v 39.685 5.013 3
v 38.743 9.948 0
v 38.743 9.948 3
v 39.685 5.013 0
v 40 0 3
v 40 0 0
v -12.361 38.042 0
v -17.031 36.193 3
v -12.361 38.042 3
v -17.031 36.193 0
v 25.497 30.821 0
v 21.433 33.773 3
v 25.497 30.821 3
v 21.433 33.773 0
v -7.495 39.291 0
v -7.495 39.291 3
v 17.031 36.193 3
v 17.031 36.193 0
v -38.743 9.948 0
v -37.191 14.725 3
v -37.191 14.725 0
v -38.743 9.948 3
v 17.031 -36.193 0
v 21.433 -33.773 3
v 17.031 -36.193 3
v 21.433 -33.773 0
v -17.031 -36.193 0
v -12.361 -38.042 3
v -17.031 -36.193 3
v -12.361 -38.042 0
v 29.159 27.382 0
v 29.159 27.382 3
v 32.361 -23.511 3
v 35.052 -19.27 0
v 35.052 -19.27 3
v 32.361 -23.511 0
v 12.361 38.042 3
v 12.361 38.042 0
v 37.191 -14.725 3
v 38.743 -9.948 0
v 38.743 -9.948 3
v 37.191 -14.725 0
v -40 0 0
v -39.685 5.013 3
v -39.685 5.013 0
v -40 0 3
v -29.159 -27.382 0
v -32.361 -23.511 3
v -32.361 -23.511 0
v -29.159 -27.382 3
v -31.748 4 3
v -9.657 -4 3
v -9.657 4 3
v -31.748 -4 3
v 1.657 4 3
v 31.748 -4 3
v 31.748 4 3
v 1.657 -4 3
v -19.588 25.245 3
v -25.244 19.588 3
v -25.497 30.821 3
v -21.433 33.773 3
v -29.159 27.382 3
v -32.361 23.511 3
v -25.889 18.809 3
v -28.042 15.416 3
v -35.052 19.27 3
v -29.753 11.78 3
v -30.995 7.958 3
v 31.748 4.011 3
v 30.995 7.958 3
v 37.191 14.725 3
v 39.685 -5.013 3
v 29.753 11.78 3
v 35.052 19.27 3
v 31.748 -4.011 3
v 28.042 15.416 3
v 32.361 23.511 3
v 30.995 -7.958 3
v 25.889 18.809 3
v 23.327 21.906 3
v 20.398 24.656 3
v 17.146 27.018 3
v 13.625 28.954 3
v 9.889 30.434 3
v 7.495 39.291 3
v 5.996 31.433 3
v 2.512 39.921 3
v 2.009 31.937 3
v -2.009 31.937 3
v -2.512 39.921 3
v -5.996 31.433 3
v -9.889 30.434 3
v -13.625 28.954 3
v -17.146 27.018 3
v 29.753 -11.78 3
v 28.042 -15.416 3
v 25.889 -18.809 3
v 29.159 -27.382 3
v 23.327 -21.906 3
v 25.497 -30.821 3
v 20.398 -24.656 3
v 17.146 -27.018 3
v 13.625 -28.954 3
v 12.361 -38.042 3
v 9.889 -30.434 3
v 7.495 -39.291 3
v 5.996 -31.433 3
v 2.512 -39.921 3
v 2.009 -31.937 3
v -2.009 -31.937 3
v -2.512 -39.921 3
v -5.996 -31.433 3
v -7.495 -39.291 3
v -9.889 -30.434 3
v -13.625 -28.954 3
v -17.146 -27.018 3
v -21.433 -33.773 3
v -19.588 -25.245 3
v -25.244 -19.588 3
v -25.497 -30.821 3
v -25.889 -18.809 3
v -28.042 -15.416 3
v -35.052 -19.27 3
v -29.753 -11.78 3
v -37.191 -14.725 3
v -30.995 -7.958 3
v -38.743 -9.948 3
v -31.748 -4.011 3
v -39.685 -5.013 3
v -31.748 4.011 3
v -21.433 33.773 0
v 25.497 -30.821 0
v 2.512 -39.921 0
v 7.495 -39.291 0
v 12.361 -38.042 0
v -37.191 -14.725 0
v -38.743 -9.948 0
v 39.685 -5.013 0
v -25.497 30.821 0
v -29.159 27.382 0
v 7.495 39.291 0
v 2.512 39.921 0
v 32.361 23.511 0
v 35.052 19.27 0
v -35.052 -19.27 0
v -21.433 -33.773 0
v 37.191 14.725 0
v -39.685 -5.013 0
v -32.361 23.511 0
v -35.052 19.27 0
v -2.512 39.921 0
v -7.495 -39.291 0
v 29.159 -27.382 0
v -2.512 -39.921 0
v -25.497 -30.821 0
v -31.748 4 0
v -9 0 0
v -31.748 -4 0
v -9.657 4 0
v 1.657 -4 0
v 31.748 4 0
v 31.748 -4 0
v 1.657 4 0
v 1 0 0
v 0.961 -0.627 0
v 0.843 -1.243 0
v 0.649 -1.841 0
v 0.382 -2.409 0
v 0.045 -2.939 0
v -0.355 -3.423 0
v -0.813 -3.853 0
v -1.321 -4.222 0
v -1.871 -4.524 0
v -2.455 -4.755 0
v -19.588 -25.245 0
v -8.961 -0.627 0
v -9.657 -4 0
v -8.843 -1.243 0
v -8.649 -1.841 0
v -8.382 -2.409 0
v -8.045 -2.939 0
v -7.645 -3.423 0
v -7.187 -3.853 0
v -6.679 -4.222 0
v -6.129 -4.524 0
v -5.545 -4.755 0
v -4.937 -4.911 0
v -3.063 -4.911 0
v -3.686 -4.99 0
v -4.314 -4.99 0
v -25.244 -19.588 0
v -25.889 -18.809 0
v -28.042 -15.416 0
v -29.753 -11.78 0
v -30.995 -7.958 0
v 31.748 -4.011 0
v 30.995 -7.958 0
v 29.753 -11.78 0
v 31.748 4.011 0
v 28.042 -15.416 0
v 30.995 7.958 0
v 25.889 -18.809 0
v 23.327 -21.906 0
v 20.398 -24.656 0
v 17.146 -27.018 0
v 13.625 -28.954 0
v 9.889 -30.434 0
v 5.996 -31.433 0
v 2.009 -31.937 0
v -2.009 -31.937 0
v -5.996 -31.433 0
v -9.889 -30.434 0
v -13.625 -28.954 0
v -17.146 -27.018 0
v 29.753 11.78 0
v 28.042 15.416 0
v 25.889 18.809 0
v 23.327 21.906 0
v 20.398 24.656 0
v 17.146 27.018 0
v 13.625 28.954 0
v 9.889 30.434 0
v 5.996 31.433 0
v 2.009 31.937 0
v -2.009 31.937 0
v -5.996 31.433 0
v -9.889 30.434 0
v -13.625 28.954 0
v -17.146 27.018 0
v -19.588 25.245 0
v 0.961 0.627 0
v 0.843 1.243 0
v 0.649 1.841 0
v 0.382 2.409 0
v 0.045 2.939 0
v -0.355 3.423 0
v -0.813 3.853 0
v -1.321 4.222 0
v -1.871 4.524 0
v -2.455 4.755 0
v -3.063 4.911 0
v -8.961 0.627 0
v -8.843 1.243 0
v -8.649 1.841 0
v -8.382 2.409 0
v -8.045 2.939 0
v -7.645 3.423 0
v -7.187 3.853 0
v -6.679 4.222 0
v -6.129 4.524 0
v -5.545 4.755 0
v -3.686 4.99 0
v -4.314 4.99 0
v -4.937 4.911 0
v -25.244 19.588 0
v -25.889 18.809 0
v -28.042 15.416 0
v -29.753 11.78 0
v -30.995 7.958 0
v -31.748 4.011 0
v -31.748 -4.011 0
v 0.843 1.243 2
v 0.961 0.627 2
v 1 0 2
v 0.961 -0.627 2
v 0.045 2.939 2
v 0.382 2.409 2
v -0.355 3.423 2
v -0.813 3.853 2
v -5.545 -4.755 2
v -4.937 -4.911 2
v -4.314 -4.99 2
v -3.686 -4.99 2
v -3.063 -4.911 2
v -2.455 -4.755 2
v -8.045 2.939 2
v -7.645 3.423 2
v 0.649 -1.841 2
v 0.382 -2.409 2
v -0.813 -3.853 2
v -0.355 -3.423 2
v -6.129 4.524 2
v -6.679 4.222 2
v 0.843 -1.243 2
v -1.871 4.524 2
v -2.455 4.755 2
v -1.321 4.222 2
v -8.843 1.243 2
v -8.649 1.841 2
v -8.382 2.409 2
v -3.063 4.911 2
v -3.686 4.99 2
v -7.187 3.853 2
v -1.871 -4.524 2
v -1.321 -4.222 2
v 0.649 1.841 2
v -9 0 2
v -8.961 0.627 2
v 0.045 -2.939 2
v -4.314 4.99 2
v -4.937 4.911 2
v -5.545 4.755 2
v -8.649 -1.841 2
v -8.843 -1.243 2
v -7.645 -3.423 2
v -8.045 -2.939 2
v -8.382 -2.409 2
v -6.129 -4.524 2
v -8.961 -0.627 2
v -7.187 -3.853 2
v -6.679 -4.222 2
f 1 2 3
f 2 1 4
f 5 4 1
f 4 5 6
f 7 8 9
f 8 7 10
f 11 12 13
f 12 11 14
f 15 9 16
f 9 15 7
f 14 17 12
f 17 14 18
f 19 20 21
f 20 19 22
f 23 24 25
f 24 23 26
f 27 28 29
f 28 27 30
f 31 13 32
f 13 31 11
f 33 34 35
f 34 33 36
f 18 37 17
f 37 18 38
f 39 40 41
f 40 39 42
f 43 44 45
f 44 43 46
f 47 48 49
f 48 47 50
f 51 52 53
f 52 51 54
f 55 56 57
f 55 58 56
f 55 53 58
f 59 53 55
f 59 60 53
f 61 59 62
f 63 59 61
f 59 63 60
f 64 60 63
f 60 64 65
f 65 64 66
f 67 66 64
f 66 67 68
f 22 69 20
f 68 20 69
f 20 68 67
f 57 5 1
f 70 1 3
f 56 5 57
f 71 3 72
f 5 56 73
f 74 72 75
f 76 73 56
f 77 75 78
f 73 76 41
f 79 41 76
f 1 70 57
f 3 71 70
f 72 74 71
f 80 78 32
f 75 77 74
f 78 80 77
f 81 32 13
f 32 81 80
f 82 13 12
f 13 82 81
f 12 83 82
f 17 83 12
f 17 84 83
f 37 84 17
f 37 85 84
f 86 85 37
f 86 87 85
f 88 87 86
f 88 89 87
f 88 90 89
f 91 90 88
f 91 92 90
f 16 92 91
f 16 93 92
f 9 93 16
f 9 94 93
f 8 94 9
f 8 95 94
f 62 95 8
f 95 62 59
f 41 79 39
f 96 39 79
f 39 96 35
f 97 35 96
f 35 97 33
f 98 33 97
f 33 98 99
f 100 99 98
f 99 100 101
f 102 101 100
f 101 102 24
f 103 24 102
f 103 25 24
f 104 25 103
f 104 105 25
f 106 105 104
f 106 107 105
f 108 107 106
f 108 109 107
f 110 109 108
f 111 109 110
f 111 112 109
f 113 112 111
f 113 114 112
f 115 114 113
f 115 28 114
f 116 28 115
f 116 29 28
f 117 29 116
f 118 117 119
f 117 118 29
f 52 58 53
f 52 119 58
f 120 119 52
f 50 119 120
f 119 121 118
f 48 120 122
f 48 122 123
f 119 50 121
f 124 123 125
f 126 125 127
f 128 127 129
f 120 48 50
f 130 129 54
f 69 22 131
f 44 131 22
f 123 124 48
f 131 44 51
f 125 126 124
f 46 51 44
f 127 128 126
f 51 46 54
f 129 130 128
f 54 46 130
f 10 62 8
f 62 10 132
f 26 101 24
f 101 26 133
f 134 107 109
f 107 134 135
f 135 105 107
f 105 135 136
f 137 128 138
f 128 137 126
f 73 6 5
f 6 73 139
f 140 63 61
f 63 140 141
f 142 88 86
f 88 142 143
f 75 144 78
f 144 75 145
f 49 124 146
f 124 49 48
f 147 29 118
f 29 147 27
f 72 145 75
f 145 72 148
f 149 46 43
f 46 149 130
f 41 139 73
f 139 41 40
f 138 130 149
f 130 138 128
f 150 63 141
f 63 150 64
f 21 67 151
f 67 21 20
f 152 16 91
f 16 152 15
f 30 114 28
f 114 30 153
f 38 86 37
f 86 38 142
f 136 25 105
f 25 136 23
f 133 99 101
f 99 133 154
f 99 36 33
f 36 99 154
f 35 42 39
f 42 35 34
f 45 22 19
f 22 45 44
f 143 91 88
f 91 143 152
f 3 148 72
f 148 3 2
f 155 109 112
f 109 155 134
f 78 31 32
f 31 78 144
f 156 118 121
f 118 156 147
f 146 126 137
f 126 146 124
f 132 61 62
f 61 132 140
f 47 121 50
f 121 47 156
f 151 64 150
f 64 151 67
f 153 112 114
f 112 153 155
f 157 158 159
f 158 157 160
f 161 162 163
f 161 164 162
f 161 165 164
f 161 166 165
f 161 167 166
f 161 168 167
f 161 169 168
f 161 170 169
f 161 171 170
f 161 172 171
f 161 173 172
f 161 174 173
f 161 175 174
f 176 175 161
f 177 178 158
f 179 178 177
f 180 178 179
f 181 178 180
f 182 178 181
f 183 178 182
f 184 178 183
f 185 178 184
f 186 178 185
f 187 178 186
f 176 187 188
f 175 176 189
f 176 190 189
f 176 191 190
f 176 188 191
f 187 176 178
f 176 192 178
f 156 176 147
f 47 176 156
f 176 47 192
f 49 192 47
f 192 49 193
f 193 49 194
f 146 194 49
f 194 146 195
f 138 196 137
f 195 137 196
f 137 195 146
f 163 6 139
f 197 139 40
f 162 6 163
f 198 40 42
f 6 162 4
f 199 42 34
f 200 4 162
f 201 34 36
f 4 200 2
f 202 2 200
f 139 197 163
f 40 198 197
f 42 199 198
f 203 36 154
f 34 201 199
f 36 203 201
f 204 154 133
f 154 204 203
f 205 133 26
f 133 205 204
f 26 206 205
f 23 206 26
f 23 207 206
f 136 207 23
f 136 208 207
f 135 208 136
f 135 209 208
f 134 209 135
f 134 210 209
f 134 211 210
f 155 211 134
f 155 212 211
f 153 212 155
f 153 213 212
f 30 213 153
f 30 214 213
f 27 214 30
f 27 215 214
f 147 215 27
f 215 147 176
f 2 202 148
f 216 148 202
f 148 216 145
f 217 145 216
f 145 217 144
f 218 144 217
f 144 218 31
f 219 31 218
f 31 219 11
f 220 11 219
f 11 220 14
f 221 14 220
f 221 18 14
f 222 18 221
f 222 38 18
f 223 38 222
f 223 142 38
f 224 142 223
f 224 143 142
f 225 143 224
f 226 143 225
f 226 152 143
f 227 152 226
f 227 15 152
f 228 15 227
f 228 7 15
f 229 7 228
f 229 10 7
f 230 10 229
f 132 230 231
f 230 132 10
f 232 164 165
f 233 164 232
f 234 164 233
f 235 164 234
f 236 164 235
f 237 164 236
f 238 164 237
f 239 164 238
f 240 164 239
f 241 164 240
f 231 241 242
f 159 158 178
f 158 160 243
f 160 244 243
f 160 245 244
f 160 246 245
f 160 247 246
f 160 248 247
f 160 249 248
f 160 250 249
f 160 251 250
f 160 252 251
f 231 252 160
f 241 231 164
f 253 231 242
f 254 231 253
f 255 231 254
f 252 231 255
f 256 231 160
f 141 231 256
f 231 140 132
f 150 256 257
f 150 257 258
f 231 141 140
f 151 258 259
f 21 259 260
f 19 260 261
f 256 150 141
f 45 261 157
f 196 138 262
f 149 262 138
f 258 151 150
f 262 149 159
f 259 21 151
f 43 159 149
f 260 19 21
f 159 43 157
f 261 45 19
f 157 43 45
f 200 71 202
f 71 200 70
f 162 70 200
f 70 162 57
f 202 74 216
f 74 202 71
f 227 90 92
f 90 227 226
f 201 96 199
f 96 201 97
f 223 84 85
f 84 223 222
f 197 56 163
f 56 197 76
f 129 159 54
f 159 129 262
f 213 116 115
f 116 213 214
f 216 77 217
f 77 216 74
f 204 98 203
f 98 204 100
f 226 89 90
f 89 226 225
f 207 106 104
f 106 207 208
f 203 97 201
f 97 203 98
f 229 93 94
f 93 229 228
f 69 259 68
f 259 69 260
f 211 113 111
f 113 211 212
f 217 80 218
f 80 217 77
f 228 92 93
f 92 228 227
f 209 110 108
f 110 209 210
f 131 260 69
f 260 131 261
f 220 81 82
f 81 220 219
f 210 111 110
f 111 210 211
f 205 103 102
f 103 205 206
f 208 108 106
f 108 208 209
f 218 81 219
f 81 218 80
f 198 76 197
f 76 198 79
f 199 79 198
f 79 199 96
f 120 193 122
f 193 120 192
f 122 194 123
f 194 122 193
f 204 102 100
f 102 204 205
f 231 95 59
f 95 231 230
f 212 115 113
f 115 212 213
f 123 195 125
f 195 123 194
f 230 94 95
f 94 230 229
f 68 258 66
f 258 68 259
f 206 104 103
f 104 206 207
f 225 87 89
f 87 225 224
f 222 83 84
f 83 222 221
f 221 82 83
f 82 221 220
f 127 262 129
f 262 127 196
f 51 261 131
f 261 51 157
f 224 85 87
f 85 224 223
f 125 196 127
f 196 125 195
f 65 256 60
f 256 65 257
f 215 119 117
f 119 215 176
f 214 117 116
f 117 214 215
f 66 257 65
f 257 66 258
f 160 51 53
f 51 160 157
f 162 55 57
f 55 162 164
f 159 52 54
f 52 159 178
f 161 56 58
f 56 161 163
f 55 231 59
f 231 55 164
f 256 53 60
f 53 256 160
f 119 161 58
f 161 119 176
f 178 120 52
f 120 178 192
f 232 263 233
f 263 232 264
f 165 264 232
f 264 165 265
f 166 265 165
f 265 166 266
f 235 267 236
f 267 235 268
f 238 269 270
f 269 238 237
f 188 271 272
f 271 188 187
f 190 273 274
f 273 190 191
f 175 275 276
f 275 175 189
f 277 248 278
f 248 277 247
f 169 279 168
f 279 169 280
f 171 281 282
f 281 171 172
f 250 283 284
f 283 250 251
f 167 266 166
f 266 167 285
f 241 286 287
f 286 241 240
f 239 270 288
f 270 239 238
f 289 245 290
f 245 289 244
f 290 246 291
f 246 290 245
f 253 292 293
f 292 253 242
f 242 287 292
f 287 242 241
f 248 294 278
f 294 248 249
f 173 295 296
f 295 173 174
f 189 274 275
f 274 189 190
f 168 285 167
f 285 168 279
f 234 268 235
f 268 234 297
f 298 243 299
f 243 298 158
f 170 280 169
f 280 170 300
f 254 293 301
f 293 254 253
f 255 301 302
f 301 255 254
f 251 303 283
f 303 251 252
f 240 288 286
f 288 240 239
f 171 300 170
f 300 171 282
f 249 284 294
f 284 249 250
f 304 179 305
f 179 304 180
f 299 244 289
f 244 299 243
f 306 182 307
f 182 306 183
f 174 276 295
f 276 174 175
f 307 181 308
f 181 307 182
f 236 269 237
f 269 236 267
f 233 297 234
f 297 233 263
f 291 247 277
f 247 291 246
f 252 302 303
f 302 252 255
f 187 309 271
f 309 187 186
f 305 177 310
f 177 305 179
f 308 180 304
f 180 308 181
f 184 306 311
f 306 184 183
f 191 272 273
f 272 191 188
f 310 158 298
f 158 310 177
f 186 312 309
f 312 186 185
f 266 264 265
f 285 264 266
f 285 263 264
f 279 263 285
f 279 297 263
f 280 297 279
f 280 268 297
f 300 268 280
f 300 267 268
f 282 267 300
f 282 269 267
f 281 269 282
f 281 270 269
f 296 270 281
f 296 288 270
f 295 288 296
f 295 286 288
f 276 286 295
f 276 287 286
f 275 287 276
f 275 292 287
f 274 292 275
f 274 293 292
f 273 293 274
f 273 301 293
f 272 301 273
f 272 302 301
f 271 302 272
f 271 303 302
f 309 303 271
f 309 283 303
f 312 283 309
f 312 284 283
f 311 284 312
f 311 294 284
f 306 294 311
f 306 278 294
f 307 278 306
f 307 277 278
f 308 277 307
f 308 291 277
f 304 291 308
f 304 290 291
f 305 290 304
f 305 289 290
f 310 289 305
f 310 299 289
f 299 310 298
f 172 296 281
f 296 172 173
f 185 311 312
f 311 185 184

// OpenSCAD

//Thickness/height of sign
height = 3;
//Diameter of sign
diameter = 80;

//width of inner and outer walls
wall_thickness = 8;

/*[Magnet]*/
//Diameter of hole for inserting magnet
magnet_diameter = 10;
//Depth of hole for magnet
magnet_thickness = 2;


/*[Extra-advanced]*/
inside_resolution = 50;

outside_resolution = 50;
//for aligning rotated bars to center of ring 
delta_stick_move = sqrt(pow((wall_thickness/2),2)/2);

// preview[view:south west, tilt:top diagonal]

//outside ring
difference(){
	translate([0,0,height/2])
	cylinder(h = height, r = diameter/2, $fn = outside_resolution, center = true);
	translate([0,0,height/2 - 1])
	cylinder(h = height + 3, r = (diameter - wall_thickness*2)/2, $fn = inside_resolution, center = true);
}

//make hole for magnet
difference(){
//union body
union(){

//middlestick
translate([-diameter/2 + wall_thickness/2, -wall_thickness/2, 0]) 
cube([diameter - wall_thickness, wall_thickness, height]);

//first sidestick

translate([delta_stick_move,delta_stick_move,0])
rotate([0,0,135]) 
cube([diameter/2 - wall_thickness/2, wall_thickness, height]);

//second sidestick
mirror([0,1,0]){

translate([delta_stick_move,delta_stick_move,0])
rotate([0,0,135])
cube([diameter/2 - wall_thickness/2, wall_thickness, height]);
}

} //end of union for body

//magnet hole
translate([-wall_thickness/2,0,-2])
cylinder(h = magnet_thickness+2, r = magnet_diameter/2, $fn = 50);
}
